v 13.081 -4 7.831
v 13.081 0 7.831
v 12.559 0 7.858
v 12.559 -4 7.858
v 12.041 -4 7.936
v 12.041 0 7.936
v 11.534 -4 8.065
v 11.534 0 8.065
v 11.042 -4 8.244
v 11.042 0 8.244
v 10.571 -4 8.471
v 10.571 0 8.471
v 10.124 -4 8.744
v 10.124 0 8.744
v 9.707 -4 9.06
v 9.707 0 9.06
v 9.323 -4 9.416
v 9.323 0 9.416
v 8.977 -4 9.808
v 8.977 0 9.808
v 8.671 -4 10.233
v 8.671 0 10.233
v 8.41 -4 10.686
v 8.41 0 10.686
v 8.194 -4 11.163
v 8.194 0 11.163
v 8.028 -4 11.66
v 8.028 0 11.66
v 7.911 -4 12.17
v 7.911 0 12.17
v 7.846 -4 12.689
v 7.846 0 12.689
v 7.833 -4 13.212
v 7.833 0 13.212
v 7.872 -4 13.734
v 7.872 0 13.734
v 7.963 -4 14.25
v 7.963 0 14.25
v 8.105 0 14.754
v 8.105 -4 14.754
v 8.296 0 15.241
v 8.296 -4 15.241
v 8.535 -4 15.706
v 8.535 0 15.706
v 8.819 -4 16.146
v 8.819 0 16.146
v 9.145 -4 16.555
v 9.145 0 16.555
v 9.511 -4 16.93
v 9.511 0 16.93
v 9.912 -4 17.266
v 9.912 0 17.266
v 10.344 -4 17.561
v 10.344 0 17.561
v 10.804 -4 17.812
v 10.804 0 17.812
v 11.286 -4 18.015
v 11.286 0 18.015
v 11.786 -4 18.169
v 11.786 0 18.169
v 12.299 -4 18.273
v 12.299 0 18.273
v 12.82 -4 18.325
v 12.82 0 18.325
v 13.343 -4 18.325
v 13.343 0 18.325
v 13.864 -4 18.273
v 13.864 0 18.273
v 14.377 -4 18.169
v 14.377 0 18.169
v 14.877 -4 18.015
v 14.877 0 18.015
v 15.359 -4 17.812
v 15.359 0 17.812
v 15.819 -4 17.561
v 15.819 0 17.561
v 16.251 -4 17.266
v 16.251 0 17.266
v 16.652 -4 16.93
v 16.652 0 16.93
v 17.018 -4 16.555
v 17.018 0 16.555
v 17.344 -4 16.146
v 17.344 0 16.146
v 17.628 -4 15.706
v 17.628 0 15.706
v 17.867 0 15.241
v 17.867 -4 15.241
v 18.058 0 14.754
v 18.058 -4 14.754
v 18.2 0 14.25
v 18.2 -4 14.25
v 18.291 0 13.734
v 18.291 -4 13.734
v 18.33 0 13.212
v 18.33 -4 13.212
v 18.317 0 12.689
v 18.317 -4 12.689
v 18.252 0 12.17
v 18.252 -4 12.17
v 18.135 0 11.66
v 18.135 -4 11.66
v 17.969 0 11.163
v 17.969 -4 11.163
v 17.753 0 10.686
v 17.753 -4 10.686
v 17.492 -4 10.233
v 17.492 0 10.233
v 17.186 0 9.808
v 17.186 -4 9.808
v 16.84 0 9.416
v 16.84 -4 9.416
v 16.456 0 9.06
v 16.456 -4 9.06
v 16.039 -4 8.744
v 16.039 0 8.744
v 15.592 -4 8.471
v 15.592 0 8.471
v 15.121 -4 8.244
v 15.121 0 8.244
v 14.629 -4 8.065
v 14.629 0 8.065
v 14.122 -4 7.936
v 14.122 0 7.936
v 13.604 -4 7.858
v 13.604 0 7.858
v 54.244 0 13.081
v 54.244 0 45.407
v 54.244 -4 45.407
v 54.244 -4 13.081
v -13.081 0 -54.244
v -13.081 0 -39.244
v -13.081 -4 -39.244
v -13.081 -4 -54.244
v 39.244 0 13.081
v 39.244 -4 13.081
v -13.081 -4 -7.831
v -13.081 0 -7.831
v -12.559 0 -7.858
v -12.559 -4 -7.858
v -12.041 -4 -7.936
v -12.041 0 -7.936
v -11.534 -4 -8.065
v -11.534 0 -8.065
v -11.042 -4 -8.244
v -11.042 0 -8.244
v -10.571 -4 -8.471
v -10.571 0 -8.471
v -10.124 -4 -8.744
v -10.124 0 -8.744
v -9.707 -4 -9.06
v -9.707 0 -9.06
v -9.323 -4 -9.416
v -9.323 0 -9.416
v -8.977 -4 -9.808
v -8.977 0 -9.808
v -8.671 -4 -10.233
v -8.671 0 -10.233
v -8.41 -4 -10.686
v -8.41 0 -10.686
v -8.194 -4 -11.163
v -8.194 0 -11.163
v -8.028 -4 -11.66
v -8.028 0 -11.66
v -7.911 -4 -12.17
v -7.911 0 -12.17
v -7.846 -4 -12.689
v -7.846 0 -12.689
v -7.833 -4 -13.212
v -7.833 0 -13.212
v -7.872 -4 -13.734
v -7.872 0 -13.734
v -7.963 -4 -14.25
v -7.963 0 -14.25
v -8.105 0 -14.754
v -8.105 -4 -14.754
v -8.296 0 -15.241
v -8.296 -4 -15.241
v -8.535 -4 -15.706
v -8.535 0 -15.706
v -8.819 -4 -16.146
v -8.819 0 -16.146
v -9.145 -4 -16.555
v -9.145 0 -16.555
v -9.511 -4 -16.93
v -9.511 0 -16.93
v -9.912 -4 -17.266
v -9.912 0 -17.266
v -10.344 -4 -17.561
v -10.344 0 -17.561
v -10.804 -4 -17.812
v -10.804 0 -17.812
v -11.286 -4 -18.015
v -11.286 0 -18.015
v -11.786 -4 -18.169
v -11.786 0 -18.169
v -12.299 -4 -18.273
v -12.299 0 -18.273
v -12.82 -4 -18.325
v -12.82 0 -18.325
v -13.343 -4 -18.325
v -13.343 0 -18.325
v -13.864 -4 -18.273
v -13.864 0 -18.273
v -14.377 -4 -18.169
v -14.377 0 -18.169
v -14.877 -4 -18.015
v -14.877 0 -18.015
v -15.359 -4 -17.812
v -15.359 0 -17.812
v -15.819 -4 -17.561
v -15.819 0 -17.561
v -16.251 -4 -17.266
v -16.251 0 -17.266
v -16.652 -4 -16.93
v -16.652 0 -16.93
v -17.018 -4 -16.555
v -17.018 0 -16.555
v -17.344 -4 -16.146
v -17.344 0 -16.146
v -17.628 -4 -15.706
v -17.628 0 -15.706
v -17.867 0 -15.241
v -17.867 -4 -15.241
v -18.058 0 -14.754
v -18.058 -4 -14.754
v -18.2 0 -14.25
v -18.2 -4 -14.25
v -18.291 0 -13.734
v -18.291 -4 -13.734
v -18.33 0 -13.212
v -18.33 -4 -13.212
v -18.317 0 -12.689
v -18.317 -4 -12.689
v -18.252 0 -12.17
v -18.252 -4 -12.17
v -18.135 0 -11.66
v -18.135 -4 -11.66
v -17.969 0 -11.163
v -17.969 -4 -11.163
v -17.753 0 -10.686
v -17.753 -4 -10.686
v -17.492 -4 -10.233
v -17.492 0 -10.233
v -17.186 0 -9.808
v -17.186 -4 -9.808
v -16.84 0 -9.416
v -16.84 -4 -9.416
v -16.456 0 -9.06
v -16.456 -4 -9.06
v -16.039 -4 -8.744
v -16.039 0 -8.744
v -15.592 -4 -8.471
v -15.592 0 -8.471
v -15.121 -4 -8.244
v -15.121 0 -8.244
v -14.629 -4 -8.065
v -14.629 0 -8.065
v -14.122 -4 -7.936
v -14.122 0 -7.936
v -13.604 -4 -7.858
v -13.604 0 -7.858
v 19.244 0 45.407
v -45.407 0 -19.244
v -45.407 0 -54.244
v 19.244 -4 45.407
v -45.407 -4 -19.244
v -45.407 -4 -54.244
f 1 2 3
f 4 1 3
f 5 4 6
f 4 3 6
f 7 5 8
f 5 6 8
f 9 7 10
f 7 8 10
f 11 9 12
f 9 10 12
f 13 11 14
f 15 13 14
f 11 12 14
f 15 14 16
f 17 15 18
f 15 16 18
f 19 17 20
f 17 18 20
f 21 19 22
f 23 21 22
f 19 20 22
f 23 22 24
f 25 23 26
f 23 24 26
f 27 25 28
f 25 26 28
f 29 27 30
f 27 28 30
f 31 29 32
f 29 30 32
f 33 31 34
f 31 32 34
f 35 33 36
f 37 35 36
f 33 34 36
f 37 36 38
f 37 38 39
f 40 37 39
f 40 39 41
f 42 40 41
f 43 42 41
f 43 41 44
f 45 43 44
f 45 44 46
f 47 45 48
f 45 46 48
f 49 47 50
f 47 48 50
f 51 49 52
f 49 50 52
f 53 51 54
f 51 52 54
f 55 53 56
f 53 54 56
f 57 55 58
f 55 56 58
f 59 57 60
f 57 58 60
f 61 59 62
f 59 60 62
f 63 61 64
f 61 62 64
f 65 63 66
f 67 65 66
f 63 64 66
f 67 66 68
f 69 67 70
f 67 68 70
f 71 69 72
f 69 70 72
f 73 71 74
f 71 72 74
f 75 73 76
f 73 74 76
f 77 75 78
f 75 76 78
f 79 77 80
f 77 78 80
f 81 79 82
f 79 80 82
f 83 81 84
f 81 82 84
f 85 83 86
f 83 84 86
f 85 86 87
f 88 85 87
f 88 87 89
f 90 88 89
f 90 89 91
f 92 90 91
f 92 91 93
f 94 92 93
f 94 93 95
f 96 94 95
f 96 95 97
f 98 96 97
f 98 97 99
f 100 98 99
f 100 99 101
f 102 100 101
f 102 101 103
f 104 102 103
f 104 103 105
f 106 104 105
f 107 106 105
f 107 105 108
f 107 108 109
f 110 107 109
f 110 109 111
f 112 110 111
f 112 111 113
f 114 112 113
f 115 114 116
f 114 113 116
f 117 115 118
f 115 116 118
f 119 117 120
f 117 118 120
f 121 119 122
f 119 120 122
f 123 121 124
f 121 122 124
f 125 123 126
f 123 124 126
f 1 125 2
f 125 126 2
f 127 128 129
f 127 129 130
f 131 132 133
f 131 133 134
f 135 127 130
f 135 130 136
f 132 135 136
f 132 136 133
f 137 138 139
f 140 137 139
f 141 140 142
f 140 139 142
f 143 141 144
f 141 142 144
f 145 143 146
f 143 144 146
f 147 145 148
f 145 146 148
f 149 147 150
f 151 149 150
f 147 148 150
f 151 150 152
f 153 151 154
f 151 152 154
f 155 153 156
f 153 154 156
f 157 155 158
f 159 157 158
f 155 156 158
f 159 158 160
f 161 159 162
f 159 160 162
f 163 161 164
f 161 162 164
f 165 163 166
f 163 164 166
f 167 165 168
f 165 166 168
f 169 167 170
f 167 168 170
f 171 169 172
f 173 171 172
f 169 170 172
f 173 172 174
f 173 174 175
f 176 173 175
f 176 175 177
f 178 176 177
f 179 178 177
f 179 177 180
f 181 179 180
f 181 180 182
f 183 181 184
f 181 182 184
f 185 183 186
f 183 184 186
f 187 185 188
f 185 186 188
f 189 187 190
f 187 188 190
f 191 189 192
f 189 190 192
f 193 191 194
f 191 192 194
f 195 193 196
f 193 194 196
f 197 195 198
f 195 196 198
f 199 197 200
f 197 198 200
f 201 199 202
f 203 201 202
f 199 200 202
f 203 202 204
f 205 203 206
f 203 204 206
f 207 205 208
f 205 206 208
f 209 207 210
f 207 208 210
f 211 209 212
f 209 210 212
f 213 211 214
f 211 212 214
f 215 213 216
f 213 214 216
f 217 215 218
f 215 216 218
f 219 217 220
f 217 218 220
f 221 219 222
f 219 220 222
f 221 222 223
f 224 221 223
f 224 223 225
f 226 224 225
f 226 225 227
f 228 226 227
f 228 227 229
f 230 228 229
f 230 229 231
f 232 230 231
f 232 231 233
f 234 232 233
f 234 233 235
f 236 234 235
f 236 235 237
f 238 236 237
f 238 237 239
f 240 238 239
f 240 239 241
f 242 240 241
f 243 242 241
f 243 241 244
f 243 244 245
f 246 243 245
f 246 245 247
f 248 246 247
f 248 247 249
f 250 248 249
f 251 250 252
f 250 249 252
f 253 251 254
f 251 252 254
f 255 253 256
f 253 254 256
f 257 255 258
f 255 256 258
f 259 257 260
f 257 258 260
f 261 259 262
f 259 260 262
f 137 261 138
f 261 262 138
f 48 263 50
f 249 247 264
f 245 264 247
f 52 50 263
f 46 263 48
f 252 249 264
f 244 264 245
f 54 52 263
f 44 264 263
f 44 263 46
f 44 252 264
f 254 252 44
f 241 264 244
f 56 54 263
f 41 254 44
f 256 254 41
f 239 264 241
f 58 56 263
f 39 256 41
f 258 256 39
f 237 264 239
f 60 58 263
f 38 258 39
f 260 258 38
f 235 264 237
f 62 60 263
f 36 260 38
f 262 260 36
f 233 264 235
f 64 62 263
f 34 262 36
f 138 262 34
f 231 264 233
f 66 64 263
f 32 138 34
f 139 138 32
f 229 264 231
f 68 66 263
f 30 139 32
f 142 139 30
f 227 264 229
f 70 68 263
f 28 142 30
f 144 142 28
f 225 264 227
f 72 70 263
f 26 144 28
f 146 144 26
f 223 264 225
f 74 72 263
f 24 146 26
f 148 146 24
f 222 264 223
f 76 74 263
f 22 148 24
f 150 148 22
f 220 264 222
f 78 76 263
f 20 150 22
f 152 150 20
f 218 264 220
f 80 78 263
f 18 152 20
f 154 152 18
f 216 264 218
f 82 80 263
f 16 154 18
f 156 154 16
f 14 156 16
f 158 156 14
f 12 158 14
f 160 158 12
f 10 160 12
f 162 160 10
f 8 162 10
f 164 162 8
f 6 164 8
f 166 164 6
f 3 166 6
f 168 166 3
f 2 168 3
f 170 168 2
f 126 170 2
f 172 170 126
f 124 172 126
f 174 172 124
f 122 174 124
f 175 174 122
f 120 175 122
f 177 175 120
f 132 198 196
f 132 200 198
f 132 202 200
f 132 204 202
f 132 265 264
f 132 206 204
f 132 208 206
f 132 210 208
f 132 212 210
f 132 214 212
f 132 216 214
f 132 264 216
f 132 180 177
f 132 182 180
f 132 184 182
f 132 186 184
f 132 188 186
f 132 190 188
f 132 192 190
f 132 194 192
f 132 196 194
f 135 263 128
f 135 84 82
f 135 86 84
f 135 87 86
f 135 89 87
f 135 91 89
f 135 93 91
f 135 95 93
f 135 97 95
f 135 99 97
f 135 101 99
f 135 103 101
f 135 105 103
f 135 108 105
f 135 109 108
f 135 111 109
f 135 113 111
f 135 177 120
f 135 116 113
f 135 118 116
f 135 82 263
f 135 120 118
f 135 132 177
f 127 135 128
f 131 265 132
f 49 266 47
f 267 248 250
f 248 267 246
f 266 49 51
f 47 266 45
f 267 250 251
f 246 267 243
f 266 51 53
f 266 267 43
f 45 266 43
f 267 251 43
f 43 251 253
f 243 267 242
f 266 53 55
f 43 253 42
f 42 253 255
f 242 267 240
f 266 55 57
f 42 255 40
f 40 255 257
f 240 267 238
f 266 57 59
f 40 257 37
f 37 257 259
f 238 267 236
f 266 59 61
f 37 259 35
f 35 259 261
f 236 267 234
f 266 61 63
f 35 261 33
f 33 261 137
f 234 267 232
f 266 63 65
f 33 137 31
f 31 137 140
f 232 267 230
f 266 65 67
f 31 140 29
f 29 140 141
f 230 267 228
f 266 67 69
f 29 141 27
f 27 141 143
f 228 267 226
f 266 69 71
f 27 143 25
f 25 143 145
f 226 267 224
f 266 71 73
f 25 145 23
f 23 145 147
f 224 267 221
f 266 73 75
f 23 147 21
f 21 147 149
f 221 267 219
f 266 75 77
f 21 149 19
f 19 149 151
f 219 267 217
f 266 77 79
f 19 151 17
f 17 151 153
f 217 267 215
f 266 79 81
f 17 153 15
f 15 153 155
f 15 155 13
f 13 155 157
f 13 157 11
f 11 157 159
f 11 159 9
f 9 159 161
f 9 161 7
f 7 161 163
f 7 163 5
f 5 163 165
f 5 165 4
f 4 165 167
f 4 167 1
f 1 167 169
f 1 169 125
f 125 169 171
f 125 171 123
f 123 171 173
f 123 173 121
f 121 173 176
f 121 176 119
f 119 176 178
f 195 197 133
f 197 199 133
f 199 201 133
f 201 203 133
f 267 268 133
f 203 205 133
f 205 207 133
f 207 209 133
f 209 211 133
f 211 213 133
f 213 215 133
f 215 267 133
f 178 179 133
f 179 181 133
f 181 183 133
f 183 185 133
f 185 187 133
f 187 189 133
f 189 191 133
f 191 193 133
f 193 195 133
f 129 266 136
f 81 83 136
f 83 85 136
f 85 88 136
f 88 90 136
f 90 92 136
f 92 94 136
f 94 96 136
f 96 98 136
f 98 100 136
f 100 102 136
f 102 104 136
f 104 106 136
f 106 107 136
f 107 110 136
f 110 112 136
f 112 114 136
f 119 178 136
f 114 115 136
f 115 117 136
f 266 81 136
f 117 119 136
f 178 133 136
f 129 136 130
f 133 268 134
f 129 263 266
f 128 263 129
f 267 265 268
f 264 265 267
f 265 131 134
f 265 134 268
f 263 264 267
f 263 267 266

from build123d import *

# Parameters (mm, degrees)
SKETCH_1_R             = 5.25
SM_BASE_FLANGE_1_DEPTH = 4


# Sheet-metal steps are written as plain solids
with BuildPart() as part:
    # Sketch 1 → Базовая кромка1 (new body)
    with BuildSketch(Plane(origin=(0, 0, 0), x_dir=(1, 0, 0), z_dir=(0, 1, 0))):
        Polygon((39.244426356, -13.081475452), (-13.081475452, 39.244426356), (-13.081475452, 54.244426356), (-45.40737726, 54.244426356), (-45.40737726, 19.244426356), (19.244426356, -45.40737726), (54.244426356, -45.40737726), (54.244426356, -13.081475452), align=None)
        with Locations(Location((-13.081475452, 13.081475452, 0), (0, 0, 270))):
            Circle(SKETCH_1_R, mode=Mode.SUBTRACT)
        with Locations(Location((13.081475452, -13.081475452, 0), (0, 0, 90))):
            Circle(SKETCH_1_R, mode=Mode.SUBTRACT)
    extrude(amount=-SM_BASE_FLANGE_1_DEPTH)


solid = part.part
